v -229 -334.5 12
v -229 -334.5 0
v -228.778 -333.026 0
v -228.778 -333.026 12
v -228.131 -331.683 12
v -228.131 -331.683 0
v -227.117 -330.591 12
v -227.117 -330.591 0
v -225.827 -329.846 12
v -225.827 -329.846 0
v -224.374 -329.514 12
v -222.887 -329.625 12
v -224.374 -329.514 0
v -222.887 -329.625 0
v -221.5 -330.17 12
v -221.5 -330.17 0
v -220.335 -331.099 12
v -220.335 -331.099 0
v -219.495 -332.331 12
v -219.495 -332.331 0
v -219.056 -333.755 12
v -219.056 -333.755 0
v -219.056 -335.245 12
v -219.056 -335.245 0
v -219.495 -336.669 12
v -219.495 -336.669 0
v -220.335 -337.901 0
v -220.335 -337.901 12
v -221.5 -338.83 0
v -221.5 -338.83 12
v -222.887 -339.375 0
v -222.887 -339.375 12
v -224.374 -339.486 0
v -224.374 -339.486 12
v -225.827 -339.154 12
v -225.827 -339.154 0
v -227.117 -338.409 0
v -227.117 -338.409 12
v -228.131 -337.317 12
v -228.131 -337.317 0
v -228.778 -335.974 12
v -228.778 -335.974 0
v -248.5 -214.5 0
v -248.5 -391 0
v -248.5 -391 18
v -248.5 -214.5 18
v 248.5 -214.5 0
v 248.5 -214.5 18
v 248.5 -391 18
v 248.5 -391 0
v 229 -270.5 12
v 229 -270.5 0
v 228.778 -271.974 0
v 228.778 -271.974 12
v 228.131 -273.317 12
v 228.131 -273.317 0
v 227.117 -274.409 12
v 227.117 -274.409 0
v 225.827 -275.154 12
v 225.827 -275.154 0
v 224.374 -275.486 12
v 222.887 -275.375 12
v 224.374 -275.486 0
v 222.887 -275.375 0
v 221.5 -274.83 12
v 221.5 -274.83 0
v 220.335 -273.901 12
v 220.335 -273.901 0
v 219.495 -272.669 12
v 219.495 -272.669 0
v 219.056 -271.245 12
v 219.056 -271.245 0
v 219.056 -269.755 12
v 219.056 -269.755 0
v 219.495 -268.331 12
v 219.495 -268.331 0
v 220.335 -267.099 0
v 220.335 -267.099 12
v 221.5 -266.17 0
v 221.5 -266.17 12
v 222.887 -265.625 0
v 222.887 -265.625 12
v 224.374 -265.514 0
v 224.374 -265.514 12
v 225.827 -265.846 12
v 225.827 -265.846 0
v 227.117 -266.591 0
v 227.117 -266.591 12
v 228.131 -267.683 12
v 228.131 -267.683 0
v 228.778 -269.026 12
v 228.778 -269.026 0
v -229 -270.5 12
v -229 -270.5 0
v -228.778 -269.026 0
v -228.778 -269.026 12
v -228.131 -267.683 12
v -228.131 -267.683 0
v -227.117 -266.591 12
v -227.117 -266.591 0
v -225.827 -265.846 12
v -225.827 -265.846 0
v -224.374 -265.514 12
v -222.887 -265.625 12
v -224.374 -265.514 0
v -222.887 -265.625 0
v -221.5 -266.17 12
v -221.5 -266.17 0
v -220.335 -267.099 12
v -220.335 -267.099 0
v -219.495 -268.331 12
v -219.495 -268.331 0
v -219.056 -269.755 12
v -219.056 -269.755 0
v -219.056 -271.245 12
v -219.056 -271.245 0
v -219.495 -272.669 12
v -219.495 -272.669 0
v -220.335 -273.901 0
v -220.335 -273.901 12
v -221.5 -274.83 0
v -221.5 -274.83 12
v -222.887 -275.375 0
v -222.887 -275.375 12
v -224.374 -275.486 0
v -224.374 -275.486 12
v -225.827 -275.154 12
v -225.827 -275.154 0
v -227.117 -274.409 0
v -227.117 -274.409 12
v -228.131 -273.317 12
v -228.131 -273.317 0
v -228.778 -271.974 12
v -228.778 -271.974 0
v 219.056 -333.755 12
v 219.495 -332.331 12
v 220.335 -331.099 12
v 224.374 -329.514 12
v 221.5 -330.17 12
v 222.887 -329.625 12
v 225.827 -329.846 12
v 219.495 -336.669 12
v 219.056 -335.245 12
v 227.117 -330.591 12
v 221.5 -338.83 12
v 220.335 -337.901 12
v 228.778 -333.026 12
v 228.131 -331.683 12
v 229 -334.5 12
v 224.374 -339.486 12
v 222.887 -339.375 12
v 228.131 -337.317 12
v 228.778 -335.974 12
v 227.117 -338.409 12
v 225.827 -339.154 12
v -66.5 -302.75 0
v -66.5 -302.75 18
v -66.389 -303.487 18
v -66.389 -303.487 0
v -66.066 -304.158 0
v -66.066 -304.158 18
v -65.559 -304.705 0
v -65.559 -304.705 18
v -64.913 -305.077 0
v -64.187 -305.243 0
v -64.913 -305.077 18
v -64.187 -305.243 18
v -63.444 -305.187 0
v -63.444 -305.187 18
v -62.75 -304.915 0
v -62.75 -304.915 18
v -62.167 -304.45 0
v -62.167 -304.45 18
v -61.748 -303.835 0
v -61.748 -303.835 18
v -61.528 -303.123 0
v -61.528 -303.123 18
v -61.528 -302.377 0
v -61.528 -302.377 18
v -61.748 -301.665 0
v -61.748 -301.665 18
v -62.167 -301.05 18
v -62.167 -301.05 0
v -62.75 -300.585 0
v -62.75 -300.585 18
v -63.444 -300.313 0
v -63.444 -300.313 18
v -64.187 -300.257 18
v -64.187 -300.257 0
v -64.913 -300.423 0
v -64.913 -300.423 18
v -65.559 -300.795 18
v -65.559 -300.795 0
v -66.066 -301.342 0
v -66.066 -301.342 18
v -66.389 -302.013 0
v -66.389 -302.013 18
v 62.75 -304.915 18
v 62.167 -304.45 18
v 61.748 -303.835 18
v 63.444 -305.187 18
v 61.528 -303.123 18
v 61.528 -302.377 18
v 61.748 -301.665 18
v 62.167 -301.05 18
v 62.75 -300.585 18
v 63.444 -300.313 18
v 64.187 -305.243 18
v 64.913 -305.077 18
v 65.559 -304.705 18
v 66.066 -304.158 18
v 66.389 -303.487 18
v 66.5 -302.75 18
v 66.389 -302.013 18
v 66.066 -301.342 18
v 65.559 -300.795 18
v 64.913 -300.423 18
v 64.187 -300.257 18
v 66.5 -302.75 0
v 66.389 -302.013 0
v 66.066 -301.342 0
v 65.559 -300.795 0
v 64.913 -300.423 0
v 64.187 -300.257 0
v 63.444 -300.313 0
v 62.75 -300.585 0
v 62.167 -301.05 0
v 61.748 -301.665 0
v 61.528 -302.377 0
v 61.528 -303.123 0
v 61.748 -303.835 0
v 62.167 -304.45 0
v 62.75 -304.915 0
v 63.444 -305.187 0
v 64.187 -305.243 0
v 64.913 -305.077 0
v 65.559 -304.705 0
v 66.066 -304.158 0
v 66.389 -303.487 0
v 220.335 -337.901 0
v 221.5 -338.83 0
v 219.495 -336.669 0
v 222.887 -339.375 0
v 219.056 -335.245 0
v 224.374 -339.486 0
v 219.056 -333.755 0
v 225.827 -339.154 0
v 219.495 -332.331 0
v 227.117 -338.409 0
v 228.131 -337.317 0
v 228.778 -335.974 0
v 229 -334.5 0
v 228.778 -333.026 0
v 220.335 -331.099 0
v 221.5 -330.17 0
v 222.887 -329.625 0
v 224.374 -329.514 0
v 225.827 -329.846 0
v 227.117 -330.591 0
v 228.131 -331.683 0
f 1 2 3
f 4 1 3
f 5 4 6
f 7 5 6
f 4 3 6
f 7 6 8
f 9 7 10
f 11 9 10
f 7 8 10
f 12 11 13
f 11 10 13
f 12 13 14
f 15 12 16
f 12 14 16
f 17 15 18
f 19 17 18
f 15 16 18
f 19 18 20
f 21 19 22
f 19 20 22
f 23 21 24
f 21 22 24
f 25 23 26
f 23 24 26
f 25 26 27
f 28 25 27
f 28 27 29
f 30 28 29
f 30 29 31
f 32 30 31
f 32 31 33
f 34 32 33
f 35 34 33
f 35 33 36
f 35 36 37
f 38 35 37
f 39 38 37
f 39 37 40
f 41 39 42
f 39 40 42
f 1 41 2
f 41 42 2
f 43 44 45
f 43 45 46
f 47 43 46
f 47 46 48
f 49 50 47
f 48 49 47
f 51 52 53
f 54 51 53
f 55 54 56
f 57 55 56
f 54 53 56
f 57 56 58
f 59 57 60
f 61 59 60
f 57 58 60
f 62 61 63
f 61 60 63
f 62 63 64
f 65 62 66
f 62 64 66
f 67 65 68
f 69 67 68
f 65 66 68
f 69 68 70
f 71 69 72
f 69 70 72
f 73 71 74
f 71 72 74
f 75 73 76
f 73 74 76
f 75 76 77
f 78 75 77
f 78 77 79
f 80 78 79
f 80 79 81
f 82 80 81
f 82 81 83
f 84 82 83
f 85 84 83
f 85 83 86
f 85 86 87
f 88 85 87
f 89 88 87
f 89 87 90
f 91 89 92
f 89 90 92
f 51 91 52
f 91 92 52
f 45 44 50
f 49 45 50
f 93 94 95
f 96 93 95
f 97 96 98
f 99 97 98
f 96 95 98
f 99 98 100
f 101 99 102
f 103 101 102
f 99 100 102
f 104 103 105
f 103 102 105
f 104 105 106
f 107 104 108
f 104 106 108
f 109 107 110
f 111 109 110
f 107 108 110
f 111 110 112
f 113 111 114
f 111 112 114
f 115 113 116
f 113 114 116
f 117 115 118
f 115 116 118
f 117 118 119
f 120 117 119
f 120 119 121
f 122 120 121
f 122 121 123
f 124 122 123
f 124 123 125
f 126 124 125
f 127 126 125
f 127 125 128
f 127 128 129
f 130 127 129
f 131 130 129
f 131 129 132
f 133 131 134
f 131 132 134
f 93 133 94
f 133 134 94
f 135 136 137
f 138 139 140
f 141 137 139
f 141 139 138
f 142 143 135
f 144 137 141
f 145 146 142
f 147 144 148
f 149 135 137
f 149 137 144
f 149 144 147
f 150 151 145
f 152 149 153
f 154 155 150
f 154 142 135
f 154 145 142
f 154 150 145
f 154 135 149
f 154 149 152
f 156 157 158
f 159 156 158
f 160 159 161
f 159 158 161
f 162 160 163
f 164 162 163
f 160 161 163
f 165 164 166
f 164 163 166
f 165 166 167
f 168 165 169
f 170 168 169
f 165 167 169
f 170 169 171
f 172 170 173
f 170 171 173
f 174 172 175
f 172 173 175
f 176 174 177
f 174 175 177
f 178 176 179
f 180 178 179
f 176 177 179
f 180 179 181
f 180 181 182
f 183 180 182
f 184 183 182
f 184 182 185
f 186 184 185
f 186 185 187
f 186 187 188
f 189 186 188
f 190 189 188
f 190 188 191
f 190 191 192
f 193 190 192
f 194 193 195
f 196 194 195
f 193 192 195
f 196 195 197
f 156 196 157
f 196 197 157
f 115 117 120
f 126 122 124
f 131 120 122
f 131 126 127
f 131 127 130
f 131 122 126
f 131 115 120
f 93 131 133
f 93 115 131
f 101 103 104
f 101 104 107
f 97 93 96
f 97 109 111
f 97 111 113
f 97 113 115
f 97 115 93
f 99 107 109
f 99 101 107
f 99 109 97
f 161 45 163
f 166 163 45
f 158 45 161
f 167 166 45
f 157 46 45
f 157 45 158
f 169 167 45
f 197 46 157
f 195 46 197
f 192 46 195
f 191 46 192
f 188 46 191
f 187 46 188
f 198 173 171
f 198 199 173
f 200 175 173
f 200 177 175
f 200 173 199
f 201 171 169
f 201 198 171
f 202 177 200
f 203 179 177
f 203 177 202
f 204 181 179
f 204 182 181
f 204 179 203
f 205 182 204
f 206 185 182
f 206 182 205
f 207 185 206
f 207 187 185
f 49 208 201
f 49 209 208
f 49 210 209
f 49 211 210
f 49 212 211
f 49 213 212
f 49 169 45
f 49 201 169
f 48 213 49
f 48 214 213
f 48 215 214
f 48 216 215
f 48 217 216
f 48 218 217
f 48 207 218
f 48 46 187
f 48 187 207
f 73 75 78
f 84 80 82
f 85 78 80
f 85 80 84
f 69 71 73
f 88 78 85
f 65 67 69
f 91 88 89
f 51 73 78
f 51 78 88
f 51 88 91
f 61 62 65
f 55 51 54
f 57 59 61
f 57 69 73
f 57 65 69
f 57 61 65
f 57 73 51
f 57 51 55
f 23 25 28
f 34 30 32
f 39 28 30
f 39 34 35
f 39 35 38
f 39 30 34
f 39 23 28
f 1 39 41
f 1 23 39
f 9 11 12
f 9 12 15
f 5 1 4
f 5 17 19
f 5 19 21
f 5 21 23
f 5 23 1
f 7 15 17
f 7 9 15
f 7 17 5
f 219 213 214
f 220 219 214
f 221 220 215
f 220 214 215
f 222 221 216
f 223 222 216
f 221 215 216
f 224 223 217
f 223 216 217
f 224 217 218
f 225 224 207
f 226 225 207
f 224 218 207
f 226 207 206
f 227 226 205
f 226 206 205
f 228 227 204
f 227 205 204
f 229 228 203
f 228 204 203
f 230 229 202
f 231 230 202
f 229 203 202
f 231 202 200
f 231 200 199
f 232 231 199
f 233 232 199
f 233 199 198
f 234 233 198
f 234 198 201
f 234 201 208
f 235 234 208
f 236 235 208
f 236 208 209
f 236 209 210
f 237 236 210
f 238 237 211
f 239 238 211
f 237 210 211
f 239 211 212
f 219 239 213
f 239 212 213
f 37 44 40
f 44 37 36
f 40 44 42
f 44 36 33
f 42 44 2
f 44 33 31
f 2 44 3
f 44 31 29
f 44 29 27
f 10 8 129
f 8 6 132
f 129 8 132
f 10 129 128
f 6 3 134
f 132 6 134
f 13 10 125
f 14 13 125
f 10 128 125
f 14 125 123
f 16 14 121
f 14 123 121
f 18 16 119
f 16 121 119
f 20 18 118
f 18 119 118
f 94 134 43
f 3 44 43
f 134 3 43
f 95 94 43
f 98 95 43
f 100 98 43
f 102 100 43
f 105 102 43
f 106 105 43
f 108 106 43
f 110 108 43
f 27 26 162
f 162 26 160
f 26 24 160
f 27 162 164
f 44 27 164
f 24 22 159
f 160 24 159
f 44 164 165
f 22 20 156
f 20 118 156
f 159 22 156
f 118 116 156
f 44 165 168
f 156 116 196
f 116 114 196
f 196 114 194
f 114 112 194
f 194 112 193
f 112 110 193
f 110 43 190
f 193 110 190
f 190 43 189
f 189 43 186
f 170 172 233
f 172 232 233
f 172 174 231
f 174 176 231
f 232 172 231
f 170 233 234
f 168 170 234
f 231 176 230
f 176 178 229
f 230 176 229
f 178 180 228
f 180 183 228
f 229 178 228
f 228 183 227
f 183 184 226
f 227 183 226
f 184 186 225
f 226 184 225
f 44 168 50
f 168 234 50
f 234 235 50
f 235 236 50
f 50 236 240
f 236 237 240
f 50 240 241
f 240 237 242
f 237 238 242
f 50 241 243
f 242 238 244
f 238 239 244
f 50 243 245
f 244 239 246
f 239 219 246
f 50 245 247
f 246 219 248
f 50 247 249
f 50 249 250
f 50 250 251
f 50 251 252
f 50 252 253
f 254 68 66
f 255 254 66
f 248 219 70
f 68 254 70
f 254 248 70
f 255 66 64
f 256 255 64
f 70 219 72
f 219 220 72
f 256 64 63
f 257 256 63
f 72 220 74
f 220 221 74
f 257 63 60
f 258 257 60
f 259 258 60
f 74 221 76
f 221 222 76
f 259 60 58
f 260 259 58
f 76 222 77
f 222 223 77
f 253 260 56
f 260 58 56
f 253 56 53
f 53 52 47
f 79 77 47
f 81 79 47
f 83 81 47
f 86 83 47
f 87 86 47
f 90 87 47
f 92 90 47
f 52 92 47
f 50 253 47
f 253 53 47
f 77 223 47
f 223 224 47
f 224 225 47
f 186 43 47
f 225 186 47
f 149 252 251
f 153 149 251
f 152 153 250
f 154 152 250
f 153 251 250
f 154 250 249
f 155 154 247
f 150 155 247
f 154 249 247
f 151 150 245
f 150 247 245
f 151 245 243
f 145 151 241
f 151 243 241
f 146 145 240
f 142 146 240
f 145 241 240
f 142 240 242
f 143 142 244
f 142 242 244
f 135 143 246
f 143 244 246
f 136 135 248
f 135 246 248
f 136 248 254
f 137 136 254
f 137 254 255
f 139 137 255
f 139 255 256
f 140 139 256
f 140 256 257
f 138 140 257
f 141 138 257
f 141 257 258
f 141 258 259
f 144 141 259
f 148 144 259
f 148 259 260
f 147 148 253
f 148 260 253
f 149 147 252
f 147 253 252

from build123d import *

# Parameters (mm, degrees)
SKETCH1_W           = 497
SKETCH1_H           = 176.5
BOSS_EXTRUDE1_DEPTH = 18
SKETCH5_R           = 2.5
CUT_EXTRUDE4_DEPTH  = 18
SKETCH6_R           = 5
CUT_EXTRUDE5_DEPTH  = 12


with BuildPart() as part:
    # Sketch1 → Boss-Extrude1 (new body)
    with BuildSketch(Plane.XY):
        with Locations((0, -302.75)):
            Rectangle(SKETCH1_W, SKETCH1_H)
    extrude(amount=BOSS_EXTRUDE1_DEPTH)

    # Sketch5 → Cut-Extrude4 (cut)
    with BuildSketch(Plane.XY.offset(18)):
        with Locations((64, -302.75)):
            Circle(SKETCH5_R)
        with Locations(Location((-64, -302.75, 0), (0, 0, 180))):
            Circle(SKETCH5_R)
    extrude(amount=-CUT_EXTRUDE4_DEPTH, mode=Mode.SUBTRACT)

    # Sketch6 → Cut-Extrude5 (cut)
    with BuildSketch(Plane(origin=(0, 0, 0), x_dir=(-1, 0, 0), z_dir=(0, 0, -1))):
        with Locations((224, -270.5)):
            Circle(SKETCH6_R)
        with Locations(Location((-224, -270.5, 0), (0, 0, 180))):
            Circle(SKETCH6_R)
        with Locations((224, -334.5)):
            Circle(SKETCH6_R)
        with Locations(Location((-224, -334.5, 0), (0, 0, 180))):
            Circle(SKETCH6_R)
    extrude(amount=-CUT_EXTRUDE5_DEPTH, mode=Mode.SUBTRACT)


solid = part.part
